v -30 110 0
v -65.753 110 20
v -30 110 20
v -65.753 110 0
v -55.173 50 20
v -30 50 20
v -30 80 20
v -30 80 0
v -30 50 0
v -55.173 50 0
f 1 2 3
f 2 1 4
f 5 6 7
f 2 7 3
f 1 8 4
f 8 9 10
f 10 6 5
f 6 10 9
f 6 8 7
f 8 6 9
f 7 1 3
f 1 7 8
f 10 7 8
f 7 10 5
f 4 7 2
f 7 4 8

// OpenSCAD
translate([-30,50,0])
scale([3,3,1])
rotate([0,0,+90]) {
    difference() {
        cube([20, 20, 20]);
        translate([10, 0, -1]) {
            rotate([0,0,50]) {
                cube([30, 30, 30]);
            }
        }
    }
}
